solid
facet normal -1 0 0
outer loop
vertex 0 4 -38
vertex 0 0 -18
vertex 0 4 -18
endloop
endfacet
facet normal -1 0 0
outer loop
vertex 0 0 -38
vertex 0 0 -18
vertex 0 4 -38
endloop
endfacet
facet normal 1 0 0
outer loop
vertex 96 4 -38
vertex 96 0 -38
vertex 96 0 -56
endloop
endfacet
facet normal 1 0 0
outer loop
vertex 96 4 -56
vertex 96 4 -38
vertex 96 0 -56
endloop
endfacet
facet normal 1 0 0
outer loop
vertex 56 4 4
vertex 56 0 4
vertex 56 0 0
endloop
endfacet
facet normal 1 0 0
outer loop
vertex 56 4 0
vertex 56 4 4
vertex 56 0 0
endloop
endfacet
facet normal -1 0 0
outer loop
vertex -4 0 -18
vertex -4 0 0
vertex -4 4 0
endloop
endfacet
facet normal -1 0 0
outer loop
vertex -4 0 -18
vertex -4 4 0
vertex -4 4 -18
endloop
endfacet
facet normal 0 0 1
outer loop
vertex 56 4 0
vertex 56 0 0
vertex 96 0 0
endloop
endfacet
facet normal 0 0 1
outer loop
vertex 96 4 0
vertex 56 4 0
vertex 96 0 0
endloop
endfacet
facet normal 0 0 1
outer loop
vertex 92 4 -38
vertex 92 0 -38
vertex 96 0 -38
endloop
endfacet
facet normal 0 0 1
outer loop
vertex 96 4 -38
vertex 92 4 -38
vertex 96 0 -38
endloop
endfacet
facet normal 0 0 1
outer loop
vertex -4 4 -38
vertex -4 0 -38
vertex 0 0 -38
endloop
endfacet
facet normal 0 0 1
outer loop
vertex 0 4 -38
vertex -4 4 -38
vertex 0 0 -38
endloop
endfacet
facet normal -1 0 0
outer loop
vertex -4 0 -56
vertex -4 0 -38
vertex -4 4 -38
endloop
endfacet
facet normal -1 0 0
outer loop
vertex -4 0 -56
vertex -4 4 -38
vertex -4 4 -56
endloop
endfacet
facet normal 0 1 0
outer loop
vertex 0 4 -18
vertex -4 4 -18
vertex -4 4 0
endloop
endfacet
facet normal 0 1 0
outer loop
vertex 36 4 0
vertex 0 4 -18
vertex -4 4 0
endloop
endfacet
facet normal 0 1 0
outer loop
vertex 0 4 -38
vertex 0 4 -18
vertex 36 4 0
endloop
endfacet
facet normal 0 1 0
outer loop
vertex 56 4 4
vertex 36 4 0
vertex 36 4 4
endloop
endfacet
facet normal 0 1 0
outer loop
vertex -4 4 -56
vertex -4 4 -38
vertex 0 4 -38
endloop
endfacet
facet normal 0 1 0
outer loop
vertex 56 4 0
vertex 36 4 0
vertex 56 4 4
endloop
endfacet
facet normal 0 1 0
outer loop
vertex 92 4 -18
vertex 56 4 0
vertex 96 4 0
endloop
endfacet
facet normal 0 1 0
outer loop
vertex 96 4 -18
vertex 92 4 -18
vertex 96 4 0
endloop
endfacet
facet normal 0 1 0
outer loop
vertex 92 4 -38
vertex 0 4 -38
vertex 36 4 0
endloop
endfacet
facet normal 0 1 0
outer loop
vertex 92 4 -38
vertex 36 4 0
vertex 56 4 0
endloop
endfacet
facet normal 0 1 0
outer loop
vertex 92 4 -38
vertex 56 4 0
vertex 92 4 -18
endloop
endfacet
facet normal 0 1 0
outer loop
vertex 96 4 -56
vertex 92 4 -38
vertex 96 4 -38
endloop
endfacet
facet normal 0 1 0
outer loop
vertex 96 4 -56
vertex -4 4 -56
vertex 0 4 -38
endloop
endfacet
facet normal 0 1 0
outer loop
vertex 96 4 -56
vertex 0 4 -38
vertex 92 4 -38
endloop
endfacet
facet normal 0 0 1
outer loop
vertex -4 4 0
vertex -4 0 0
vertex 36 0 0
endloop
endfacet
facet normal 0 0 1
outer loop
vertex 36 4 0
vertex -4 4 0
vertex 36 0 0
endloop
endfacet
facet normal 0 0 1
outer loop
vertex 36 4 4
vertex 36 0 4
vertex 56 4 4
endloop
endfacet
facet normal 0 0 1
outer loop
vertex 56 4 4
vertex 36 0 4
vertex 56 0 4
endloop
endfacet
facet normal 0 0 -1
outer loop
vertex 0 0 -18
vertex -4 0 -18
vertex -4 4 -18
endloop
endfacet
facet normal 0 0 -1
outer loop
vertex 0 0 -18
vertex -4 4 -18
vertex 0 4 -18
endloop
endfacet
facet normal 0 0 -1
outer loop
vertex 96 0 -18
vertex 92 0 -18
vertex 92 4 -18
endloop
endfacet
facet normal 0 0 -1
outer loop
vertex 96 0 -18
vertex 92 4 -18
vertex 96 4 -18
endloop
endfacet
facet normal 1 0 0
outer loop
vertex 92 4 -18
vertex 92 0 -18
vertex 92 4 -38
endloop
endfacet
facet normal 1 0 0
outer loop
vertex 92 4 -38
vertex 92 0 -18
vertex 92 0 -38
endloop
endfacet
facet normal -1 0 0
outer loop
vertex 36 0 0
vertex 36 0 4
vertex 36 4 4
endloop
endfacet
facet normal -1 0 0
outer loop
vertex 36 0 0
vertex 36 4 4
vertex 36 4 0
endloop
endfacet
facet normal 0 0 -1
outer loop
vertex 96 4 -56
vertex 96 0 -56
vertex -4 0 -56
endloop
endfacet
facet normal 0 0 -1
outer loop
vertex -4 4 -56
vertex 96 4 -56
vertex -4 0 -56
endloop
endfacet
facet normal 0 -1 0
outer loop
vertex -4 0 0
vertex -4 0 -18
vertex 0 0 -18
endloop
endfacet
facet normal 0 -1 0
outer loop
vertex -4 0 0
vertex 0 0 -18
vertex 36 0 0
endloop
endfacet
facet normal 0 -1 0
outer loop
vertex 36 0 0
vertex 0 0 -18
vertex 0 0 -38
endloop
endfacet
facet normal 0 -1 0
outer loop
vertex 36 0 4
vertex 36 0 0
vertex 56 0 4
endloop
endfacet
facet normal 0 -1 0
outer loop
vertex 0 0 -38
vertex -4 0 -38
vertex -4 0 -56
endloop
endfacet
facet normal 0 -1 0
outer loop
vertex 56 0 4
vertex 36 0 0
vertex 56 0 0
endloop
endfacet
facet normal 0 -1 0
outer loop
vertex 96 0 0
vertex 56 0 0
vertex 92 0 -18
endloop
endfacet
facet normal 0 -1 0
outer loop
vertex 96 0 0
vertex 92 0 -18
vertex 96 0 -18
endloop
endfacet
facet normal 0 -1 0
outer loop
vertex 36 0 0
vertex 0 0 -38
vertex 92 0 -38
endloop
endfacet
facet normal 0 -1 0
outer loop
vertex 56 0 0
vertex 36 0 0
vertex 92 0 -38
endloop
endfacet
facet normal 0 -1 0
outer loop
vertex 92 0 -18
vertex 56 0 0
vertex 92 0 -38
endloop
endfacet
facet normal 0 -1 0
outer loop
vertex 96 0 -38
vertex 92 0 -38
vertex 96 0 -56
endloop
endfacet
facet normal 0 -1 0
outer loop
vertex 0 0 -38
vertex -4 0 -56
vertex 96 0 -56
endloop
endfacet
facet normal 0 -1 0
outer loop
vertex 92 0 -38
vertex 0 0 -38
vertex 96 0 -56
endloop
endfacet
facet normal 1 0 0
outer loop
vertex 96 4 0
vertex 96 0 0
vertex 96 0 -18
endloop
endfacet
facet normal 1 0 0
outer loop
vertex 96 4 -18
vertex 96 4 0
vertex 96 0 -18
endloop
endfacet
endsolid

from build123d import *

# Parameters (mm, degrees)
SKETCH_1_W      = 92
SKETCH_1_H      = 56
SKETCH_1_W_2    = 4
SKETCH_1_H_2    = 18
SKETCH_1_W_3    = 20
SKETCH_1_H_3    = 4
EXTRUDE_1_DEPTH = 4


with BuildPart() as part:
    # 草图1 → 凸台-拉伸1 (new body)
    with BuildSketch(Plane(origin=(0, 0, 0), x_dir=(1, 0, 0), z_dir=(0, 1, 0))):
        with Locations((46, 28)):
            Rectangle(SKETCH_1_W, SKETCH_1_H)
        with Locations((-2, 9)):
            Rectangle(SKETCH_1_W_2, SKETCH_1_H_2)
        with Locations((-2, 47)):
            Rectangle(SKETCH_1_W_2, SKETCH_1_H_2)
        with Locations((46, -2)):
            Rectangle(SKETCH_1_W_3, SKETCH_1_H_3)
        with Locations((94, 9)):
            Rectangle(SKETCH_1_W_2, SKETCH_1_H_2)
        with Locations((94, 47)):
            Rectangle(SKETCH_1_W_2, SKETCH_1_H_2)
    extrude(amount=EXTRUDE_1_DEPTH)


solid = part.part
